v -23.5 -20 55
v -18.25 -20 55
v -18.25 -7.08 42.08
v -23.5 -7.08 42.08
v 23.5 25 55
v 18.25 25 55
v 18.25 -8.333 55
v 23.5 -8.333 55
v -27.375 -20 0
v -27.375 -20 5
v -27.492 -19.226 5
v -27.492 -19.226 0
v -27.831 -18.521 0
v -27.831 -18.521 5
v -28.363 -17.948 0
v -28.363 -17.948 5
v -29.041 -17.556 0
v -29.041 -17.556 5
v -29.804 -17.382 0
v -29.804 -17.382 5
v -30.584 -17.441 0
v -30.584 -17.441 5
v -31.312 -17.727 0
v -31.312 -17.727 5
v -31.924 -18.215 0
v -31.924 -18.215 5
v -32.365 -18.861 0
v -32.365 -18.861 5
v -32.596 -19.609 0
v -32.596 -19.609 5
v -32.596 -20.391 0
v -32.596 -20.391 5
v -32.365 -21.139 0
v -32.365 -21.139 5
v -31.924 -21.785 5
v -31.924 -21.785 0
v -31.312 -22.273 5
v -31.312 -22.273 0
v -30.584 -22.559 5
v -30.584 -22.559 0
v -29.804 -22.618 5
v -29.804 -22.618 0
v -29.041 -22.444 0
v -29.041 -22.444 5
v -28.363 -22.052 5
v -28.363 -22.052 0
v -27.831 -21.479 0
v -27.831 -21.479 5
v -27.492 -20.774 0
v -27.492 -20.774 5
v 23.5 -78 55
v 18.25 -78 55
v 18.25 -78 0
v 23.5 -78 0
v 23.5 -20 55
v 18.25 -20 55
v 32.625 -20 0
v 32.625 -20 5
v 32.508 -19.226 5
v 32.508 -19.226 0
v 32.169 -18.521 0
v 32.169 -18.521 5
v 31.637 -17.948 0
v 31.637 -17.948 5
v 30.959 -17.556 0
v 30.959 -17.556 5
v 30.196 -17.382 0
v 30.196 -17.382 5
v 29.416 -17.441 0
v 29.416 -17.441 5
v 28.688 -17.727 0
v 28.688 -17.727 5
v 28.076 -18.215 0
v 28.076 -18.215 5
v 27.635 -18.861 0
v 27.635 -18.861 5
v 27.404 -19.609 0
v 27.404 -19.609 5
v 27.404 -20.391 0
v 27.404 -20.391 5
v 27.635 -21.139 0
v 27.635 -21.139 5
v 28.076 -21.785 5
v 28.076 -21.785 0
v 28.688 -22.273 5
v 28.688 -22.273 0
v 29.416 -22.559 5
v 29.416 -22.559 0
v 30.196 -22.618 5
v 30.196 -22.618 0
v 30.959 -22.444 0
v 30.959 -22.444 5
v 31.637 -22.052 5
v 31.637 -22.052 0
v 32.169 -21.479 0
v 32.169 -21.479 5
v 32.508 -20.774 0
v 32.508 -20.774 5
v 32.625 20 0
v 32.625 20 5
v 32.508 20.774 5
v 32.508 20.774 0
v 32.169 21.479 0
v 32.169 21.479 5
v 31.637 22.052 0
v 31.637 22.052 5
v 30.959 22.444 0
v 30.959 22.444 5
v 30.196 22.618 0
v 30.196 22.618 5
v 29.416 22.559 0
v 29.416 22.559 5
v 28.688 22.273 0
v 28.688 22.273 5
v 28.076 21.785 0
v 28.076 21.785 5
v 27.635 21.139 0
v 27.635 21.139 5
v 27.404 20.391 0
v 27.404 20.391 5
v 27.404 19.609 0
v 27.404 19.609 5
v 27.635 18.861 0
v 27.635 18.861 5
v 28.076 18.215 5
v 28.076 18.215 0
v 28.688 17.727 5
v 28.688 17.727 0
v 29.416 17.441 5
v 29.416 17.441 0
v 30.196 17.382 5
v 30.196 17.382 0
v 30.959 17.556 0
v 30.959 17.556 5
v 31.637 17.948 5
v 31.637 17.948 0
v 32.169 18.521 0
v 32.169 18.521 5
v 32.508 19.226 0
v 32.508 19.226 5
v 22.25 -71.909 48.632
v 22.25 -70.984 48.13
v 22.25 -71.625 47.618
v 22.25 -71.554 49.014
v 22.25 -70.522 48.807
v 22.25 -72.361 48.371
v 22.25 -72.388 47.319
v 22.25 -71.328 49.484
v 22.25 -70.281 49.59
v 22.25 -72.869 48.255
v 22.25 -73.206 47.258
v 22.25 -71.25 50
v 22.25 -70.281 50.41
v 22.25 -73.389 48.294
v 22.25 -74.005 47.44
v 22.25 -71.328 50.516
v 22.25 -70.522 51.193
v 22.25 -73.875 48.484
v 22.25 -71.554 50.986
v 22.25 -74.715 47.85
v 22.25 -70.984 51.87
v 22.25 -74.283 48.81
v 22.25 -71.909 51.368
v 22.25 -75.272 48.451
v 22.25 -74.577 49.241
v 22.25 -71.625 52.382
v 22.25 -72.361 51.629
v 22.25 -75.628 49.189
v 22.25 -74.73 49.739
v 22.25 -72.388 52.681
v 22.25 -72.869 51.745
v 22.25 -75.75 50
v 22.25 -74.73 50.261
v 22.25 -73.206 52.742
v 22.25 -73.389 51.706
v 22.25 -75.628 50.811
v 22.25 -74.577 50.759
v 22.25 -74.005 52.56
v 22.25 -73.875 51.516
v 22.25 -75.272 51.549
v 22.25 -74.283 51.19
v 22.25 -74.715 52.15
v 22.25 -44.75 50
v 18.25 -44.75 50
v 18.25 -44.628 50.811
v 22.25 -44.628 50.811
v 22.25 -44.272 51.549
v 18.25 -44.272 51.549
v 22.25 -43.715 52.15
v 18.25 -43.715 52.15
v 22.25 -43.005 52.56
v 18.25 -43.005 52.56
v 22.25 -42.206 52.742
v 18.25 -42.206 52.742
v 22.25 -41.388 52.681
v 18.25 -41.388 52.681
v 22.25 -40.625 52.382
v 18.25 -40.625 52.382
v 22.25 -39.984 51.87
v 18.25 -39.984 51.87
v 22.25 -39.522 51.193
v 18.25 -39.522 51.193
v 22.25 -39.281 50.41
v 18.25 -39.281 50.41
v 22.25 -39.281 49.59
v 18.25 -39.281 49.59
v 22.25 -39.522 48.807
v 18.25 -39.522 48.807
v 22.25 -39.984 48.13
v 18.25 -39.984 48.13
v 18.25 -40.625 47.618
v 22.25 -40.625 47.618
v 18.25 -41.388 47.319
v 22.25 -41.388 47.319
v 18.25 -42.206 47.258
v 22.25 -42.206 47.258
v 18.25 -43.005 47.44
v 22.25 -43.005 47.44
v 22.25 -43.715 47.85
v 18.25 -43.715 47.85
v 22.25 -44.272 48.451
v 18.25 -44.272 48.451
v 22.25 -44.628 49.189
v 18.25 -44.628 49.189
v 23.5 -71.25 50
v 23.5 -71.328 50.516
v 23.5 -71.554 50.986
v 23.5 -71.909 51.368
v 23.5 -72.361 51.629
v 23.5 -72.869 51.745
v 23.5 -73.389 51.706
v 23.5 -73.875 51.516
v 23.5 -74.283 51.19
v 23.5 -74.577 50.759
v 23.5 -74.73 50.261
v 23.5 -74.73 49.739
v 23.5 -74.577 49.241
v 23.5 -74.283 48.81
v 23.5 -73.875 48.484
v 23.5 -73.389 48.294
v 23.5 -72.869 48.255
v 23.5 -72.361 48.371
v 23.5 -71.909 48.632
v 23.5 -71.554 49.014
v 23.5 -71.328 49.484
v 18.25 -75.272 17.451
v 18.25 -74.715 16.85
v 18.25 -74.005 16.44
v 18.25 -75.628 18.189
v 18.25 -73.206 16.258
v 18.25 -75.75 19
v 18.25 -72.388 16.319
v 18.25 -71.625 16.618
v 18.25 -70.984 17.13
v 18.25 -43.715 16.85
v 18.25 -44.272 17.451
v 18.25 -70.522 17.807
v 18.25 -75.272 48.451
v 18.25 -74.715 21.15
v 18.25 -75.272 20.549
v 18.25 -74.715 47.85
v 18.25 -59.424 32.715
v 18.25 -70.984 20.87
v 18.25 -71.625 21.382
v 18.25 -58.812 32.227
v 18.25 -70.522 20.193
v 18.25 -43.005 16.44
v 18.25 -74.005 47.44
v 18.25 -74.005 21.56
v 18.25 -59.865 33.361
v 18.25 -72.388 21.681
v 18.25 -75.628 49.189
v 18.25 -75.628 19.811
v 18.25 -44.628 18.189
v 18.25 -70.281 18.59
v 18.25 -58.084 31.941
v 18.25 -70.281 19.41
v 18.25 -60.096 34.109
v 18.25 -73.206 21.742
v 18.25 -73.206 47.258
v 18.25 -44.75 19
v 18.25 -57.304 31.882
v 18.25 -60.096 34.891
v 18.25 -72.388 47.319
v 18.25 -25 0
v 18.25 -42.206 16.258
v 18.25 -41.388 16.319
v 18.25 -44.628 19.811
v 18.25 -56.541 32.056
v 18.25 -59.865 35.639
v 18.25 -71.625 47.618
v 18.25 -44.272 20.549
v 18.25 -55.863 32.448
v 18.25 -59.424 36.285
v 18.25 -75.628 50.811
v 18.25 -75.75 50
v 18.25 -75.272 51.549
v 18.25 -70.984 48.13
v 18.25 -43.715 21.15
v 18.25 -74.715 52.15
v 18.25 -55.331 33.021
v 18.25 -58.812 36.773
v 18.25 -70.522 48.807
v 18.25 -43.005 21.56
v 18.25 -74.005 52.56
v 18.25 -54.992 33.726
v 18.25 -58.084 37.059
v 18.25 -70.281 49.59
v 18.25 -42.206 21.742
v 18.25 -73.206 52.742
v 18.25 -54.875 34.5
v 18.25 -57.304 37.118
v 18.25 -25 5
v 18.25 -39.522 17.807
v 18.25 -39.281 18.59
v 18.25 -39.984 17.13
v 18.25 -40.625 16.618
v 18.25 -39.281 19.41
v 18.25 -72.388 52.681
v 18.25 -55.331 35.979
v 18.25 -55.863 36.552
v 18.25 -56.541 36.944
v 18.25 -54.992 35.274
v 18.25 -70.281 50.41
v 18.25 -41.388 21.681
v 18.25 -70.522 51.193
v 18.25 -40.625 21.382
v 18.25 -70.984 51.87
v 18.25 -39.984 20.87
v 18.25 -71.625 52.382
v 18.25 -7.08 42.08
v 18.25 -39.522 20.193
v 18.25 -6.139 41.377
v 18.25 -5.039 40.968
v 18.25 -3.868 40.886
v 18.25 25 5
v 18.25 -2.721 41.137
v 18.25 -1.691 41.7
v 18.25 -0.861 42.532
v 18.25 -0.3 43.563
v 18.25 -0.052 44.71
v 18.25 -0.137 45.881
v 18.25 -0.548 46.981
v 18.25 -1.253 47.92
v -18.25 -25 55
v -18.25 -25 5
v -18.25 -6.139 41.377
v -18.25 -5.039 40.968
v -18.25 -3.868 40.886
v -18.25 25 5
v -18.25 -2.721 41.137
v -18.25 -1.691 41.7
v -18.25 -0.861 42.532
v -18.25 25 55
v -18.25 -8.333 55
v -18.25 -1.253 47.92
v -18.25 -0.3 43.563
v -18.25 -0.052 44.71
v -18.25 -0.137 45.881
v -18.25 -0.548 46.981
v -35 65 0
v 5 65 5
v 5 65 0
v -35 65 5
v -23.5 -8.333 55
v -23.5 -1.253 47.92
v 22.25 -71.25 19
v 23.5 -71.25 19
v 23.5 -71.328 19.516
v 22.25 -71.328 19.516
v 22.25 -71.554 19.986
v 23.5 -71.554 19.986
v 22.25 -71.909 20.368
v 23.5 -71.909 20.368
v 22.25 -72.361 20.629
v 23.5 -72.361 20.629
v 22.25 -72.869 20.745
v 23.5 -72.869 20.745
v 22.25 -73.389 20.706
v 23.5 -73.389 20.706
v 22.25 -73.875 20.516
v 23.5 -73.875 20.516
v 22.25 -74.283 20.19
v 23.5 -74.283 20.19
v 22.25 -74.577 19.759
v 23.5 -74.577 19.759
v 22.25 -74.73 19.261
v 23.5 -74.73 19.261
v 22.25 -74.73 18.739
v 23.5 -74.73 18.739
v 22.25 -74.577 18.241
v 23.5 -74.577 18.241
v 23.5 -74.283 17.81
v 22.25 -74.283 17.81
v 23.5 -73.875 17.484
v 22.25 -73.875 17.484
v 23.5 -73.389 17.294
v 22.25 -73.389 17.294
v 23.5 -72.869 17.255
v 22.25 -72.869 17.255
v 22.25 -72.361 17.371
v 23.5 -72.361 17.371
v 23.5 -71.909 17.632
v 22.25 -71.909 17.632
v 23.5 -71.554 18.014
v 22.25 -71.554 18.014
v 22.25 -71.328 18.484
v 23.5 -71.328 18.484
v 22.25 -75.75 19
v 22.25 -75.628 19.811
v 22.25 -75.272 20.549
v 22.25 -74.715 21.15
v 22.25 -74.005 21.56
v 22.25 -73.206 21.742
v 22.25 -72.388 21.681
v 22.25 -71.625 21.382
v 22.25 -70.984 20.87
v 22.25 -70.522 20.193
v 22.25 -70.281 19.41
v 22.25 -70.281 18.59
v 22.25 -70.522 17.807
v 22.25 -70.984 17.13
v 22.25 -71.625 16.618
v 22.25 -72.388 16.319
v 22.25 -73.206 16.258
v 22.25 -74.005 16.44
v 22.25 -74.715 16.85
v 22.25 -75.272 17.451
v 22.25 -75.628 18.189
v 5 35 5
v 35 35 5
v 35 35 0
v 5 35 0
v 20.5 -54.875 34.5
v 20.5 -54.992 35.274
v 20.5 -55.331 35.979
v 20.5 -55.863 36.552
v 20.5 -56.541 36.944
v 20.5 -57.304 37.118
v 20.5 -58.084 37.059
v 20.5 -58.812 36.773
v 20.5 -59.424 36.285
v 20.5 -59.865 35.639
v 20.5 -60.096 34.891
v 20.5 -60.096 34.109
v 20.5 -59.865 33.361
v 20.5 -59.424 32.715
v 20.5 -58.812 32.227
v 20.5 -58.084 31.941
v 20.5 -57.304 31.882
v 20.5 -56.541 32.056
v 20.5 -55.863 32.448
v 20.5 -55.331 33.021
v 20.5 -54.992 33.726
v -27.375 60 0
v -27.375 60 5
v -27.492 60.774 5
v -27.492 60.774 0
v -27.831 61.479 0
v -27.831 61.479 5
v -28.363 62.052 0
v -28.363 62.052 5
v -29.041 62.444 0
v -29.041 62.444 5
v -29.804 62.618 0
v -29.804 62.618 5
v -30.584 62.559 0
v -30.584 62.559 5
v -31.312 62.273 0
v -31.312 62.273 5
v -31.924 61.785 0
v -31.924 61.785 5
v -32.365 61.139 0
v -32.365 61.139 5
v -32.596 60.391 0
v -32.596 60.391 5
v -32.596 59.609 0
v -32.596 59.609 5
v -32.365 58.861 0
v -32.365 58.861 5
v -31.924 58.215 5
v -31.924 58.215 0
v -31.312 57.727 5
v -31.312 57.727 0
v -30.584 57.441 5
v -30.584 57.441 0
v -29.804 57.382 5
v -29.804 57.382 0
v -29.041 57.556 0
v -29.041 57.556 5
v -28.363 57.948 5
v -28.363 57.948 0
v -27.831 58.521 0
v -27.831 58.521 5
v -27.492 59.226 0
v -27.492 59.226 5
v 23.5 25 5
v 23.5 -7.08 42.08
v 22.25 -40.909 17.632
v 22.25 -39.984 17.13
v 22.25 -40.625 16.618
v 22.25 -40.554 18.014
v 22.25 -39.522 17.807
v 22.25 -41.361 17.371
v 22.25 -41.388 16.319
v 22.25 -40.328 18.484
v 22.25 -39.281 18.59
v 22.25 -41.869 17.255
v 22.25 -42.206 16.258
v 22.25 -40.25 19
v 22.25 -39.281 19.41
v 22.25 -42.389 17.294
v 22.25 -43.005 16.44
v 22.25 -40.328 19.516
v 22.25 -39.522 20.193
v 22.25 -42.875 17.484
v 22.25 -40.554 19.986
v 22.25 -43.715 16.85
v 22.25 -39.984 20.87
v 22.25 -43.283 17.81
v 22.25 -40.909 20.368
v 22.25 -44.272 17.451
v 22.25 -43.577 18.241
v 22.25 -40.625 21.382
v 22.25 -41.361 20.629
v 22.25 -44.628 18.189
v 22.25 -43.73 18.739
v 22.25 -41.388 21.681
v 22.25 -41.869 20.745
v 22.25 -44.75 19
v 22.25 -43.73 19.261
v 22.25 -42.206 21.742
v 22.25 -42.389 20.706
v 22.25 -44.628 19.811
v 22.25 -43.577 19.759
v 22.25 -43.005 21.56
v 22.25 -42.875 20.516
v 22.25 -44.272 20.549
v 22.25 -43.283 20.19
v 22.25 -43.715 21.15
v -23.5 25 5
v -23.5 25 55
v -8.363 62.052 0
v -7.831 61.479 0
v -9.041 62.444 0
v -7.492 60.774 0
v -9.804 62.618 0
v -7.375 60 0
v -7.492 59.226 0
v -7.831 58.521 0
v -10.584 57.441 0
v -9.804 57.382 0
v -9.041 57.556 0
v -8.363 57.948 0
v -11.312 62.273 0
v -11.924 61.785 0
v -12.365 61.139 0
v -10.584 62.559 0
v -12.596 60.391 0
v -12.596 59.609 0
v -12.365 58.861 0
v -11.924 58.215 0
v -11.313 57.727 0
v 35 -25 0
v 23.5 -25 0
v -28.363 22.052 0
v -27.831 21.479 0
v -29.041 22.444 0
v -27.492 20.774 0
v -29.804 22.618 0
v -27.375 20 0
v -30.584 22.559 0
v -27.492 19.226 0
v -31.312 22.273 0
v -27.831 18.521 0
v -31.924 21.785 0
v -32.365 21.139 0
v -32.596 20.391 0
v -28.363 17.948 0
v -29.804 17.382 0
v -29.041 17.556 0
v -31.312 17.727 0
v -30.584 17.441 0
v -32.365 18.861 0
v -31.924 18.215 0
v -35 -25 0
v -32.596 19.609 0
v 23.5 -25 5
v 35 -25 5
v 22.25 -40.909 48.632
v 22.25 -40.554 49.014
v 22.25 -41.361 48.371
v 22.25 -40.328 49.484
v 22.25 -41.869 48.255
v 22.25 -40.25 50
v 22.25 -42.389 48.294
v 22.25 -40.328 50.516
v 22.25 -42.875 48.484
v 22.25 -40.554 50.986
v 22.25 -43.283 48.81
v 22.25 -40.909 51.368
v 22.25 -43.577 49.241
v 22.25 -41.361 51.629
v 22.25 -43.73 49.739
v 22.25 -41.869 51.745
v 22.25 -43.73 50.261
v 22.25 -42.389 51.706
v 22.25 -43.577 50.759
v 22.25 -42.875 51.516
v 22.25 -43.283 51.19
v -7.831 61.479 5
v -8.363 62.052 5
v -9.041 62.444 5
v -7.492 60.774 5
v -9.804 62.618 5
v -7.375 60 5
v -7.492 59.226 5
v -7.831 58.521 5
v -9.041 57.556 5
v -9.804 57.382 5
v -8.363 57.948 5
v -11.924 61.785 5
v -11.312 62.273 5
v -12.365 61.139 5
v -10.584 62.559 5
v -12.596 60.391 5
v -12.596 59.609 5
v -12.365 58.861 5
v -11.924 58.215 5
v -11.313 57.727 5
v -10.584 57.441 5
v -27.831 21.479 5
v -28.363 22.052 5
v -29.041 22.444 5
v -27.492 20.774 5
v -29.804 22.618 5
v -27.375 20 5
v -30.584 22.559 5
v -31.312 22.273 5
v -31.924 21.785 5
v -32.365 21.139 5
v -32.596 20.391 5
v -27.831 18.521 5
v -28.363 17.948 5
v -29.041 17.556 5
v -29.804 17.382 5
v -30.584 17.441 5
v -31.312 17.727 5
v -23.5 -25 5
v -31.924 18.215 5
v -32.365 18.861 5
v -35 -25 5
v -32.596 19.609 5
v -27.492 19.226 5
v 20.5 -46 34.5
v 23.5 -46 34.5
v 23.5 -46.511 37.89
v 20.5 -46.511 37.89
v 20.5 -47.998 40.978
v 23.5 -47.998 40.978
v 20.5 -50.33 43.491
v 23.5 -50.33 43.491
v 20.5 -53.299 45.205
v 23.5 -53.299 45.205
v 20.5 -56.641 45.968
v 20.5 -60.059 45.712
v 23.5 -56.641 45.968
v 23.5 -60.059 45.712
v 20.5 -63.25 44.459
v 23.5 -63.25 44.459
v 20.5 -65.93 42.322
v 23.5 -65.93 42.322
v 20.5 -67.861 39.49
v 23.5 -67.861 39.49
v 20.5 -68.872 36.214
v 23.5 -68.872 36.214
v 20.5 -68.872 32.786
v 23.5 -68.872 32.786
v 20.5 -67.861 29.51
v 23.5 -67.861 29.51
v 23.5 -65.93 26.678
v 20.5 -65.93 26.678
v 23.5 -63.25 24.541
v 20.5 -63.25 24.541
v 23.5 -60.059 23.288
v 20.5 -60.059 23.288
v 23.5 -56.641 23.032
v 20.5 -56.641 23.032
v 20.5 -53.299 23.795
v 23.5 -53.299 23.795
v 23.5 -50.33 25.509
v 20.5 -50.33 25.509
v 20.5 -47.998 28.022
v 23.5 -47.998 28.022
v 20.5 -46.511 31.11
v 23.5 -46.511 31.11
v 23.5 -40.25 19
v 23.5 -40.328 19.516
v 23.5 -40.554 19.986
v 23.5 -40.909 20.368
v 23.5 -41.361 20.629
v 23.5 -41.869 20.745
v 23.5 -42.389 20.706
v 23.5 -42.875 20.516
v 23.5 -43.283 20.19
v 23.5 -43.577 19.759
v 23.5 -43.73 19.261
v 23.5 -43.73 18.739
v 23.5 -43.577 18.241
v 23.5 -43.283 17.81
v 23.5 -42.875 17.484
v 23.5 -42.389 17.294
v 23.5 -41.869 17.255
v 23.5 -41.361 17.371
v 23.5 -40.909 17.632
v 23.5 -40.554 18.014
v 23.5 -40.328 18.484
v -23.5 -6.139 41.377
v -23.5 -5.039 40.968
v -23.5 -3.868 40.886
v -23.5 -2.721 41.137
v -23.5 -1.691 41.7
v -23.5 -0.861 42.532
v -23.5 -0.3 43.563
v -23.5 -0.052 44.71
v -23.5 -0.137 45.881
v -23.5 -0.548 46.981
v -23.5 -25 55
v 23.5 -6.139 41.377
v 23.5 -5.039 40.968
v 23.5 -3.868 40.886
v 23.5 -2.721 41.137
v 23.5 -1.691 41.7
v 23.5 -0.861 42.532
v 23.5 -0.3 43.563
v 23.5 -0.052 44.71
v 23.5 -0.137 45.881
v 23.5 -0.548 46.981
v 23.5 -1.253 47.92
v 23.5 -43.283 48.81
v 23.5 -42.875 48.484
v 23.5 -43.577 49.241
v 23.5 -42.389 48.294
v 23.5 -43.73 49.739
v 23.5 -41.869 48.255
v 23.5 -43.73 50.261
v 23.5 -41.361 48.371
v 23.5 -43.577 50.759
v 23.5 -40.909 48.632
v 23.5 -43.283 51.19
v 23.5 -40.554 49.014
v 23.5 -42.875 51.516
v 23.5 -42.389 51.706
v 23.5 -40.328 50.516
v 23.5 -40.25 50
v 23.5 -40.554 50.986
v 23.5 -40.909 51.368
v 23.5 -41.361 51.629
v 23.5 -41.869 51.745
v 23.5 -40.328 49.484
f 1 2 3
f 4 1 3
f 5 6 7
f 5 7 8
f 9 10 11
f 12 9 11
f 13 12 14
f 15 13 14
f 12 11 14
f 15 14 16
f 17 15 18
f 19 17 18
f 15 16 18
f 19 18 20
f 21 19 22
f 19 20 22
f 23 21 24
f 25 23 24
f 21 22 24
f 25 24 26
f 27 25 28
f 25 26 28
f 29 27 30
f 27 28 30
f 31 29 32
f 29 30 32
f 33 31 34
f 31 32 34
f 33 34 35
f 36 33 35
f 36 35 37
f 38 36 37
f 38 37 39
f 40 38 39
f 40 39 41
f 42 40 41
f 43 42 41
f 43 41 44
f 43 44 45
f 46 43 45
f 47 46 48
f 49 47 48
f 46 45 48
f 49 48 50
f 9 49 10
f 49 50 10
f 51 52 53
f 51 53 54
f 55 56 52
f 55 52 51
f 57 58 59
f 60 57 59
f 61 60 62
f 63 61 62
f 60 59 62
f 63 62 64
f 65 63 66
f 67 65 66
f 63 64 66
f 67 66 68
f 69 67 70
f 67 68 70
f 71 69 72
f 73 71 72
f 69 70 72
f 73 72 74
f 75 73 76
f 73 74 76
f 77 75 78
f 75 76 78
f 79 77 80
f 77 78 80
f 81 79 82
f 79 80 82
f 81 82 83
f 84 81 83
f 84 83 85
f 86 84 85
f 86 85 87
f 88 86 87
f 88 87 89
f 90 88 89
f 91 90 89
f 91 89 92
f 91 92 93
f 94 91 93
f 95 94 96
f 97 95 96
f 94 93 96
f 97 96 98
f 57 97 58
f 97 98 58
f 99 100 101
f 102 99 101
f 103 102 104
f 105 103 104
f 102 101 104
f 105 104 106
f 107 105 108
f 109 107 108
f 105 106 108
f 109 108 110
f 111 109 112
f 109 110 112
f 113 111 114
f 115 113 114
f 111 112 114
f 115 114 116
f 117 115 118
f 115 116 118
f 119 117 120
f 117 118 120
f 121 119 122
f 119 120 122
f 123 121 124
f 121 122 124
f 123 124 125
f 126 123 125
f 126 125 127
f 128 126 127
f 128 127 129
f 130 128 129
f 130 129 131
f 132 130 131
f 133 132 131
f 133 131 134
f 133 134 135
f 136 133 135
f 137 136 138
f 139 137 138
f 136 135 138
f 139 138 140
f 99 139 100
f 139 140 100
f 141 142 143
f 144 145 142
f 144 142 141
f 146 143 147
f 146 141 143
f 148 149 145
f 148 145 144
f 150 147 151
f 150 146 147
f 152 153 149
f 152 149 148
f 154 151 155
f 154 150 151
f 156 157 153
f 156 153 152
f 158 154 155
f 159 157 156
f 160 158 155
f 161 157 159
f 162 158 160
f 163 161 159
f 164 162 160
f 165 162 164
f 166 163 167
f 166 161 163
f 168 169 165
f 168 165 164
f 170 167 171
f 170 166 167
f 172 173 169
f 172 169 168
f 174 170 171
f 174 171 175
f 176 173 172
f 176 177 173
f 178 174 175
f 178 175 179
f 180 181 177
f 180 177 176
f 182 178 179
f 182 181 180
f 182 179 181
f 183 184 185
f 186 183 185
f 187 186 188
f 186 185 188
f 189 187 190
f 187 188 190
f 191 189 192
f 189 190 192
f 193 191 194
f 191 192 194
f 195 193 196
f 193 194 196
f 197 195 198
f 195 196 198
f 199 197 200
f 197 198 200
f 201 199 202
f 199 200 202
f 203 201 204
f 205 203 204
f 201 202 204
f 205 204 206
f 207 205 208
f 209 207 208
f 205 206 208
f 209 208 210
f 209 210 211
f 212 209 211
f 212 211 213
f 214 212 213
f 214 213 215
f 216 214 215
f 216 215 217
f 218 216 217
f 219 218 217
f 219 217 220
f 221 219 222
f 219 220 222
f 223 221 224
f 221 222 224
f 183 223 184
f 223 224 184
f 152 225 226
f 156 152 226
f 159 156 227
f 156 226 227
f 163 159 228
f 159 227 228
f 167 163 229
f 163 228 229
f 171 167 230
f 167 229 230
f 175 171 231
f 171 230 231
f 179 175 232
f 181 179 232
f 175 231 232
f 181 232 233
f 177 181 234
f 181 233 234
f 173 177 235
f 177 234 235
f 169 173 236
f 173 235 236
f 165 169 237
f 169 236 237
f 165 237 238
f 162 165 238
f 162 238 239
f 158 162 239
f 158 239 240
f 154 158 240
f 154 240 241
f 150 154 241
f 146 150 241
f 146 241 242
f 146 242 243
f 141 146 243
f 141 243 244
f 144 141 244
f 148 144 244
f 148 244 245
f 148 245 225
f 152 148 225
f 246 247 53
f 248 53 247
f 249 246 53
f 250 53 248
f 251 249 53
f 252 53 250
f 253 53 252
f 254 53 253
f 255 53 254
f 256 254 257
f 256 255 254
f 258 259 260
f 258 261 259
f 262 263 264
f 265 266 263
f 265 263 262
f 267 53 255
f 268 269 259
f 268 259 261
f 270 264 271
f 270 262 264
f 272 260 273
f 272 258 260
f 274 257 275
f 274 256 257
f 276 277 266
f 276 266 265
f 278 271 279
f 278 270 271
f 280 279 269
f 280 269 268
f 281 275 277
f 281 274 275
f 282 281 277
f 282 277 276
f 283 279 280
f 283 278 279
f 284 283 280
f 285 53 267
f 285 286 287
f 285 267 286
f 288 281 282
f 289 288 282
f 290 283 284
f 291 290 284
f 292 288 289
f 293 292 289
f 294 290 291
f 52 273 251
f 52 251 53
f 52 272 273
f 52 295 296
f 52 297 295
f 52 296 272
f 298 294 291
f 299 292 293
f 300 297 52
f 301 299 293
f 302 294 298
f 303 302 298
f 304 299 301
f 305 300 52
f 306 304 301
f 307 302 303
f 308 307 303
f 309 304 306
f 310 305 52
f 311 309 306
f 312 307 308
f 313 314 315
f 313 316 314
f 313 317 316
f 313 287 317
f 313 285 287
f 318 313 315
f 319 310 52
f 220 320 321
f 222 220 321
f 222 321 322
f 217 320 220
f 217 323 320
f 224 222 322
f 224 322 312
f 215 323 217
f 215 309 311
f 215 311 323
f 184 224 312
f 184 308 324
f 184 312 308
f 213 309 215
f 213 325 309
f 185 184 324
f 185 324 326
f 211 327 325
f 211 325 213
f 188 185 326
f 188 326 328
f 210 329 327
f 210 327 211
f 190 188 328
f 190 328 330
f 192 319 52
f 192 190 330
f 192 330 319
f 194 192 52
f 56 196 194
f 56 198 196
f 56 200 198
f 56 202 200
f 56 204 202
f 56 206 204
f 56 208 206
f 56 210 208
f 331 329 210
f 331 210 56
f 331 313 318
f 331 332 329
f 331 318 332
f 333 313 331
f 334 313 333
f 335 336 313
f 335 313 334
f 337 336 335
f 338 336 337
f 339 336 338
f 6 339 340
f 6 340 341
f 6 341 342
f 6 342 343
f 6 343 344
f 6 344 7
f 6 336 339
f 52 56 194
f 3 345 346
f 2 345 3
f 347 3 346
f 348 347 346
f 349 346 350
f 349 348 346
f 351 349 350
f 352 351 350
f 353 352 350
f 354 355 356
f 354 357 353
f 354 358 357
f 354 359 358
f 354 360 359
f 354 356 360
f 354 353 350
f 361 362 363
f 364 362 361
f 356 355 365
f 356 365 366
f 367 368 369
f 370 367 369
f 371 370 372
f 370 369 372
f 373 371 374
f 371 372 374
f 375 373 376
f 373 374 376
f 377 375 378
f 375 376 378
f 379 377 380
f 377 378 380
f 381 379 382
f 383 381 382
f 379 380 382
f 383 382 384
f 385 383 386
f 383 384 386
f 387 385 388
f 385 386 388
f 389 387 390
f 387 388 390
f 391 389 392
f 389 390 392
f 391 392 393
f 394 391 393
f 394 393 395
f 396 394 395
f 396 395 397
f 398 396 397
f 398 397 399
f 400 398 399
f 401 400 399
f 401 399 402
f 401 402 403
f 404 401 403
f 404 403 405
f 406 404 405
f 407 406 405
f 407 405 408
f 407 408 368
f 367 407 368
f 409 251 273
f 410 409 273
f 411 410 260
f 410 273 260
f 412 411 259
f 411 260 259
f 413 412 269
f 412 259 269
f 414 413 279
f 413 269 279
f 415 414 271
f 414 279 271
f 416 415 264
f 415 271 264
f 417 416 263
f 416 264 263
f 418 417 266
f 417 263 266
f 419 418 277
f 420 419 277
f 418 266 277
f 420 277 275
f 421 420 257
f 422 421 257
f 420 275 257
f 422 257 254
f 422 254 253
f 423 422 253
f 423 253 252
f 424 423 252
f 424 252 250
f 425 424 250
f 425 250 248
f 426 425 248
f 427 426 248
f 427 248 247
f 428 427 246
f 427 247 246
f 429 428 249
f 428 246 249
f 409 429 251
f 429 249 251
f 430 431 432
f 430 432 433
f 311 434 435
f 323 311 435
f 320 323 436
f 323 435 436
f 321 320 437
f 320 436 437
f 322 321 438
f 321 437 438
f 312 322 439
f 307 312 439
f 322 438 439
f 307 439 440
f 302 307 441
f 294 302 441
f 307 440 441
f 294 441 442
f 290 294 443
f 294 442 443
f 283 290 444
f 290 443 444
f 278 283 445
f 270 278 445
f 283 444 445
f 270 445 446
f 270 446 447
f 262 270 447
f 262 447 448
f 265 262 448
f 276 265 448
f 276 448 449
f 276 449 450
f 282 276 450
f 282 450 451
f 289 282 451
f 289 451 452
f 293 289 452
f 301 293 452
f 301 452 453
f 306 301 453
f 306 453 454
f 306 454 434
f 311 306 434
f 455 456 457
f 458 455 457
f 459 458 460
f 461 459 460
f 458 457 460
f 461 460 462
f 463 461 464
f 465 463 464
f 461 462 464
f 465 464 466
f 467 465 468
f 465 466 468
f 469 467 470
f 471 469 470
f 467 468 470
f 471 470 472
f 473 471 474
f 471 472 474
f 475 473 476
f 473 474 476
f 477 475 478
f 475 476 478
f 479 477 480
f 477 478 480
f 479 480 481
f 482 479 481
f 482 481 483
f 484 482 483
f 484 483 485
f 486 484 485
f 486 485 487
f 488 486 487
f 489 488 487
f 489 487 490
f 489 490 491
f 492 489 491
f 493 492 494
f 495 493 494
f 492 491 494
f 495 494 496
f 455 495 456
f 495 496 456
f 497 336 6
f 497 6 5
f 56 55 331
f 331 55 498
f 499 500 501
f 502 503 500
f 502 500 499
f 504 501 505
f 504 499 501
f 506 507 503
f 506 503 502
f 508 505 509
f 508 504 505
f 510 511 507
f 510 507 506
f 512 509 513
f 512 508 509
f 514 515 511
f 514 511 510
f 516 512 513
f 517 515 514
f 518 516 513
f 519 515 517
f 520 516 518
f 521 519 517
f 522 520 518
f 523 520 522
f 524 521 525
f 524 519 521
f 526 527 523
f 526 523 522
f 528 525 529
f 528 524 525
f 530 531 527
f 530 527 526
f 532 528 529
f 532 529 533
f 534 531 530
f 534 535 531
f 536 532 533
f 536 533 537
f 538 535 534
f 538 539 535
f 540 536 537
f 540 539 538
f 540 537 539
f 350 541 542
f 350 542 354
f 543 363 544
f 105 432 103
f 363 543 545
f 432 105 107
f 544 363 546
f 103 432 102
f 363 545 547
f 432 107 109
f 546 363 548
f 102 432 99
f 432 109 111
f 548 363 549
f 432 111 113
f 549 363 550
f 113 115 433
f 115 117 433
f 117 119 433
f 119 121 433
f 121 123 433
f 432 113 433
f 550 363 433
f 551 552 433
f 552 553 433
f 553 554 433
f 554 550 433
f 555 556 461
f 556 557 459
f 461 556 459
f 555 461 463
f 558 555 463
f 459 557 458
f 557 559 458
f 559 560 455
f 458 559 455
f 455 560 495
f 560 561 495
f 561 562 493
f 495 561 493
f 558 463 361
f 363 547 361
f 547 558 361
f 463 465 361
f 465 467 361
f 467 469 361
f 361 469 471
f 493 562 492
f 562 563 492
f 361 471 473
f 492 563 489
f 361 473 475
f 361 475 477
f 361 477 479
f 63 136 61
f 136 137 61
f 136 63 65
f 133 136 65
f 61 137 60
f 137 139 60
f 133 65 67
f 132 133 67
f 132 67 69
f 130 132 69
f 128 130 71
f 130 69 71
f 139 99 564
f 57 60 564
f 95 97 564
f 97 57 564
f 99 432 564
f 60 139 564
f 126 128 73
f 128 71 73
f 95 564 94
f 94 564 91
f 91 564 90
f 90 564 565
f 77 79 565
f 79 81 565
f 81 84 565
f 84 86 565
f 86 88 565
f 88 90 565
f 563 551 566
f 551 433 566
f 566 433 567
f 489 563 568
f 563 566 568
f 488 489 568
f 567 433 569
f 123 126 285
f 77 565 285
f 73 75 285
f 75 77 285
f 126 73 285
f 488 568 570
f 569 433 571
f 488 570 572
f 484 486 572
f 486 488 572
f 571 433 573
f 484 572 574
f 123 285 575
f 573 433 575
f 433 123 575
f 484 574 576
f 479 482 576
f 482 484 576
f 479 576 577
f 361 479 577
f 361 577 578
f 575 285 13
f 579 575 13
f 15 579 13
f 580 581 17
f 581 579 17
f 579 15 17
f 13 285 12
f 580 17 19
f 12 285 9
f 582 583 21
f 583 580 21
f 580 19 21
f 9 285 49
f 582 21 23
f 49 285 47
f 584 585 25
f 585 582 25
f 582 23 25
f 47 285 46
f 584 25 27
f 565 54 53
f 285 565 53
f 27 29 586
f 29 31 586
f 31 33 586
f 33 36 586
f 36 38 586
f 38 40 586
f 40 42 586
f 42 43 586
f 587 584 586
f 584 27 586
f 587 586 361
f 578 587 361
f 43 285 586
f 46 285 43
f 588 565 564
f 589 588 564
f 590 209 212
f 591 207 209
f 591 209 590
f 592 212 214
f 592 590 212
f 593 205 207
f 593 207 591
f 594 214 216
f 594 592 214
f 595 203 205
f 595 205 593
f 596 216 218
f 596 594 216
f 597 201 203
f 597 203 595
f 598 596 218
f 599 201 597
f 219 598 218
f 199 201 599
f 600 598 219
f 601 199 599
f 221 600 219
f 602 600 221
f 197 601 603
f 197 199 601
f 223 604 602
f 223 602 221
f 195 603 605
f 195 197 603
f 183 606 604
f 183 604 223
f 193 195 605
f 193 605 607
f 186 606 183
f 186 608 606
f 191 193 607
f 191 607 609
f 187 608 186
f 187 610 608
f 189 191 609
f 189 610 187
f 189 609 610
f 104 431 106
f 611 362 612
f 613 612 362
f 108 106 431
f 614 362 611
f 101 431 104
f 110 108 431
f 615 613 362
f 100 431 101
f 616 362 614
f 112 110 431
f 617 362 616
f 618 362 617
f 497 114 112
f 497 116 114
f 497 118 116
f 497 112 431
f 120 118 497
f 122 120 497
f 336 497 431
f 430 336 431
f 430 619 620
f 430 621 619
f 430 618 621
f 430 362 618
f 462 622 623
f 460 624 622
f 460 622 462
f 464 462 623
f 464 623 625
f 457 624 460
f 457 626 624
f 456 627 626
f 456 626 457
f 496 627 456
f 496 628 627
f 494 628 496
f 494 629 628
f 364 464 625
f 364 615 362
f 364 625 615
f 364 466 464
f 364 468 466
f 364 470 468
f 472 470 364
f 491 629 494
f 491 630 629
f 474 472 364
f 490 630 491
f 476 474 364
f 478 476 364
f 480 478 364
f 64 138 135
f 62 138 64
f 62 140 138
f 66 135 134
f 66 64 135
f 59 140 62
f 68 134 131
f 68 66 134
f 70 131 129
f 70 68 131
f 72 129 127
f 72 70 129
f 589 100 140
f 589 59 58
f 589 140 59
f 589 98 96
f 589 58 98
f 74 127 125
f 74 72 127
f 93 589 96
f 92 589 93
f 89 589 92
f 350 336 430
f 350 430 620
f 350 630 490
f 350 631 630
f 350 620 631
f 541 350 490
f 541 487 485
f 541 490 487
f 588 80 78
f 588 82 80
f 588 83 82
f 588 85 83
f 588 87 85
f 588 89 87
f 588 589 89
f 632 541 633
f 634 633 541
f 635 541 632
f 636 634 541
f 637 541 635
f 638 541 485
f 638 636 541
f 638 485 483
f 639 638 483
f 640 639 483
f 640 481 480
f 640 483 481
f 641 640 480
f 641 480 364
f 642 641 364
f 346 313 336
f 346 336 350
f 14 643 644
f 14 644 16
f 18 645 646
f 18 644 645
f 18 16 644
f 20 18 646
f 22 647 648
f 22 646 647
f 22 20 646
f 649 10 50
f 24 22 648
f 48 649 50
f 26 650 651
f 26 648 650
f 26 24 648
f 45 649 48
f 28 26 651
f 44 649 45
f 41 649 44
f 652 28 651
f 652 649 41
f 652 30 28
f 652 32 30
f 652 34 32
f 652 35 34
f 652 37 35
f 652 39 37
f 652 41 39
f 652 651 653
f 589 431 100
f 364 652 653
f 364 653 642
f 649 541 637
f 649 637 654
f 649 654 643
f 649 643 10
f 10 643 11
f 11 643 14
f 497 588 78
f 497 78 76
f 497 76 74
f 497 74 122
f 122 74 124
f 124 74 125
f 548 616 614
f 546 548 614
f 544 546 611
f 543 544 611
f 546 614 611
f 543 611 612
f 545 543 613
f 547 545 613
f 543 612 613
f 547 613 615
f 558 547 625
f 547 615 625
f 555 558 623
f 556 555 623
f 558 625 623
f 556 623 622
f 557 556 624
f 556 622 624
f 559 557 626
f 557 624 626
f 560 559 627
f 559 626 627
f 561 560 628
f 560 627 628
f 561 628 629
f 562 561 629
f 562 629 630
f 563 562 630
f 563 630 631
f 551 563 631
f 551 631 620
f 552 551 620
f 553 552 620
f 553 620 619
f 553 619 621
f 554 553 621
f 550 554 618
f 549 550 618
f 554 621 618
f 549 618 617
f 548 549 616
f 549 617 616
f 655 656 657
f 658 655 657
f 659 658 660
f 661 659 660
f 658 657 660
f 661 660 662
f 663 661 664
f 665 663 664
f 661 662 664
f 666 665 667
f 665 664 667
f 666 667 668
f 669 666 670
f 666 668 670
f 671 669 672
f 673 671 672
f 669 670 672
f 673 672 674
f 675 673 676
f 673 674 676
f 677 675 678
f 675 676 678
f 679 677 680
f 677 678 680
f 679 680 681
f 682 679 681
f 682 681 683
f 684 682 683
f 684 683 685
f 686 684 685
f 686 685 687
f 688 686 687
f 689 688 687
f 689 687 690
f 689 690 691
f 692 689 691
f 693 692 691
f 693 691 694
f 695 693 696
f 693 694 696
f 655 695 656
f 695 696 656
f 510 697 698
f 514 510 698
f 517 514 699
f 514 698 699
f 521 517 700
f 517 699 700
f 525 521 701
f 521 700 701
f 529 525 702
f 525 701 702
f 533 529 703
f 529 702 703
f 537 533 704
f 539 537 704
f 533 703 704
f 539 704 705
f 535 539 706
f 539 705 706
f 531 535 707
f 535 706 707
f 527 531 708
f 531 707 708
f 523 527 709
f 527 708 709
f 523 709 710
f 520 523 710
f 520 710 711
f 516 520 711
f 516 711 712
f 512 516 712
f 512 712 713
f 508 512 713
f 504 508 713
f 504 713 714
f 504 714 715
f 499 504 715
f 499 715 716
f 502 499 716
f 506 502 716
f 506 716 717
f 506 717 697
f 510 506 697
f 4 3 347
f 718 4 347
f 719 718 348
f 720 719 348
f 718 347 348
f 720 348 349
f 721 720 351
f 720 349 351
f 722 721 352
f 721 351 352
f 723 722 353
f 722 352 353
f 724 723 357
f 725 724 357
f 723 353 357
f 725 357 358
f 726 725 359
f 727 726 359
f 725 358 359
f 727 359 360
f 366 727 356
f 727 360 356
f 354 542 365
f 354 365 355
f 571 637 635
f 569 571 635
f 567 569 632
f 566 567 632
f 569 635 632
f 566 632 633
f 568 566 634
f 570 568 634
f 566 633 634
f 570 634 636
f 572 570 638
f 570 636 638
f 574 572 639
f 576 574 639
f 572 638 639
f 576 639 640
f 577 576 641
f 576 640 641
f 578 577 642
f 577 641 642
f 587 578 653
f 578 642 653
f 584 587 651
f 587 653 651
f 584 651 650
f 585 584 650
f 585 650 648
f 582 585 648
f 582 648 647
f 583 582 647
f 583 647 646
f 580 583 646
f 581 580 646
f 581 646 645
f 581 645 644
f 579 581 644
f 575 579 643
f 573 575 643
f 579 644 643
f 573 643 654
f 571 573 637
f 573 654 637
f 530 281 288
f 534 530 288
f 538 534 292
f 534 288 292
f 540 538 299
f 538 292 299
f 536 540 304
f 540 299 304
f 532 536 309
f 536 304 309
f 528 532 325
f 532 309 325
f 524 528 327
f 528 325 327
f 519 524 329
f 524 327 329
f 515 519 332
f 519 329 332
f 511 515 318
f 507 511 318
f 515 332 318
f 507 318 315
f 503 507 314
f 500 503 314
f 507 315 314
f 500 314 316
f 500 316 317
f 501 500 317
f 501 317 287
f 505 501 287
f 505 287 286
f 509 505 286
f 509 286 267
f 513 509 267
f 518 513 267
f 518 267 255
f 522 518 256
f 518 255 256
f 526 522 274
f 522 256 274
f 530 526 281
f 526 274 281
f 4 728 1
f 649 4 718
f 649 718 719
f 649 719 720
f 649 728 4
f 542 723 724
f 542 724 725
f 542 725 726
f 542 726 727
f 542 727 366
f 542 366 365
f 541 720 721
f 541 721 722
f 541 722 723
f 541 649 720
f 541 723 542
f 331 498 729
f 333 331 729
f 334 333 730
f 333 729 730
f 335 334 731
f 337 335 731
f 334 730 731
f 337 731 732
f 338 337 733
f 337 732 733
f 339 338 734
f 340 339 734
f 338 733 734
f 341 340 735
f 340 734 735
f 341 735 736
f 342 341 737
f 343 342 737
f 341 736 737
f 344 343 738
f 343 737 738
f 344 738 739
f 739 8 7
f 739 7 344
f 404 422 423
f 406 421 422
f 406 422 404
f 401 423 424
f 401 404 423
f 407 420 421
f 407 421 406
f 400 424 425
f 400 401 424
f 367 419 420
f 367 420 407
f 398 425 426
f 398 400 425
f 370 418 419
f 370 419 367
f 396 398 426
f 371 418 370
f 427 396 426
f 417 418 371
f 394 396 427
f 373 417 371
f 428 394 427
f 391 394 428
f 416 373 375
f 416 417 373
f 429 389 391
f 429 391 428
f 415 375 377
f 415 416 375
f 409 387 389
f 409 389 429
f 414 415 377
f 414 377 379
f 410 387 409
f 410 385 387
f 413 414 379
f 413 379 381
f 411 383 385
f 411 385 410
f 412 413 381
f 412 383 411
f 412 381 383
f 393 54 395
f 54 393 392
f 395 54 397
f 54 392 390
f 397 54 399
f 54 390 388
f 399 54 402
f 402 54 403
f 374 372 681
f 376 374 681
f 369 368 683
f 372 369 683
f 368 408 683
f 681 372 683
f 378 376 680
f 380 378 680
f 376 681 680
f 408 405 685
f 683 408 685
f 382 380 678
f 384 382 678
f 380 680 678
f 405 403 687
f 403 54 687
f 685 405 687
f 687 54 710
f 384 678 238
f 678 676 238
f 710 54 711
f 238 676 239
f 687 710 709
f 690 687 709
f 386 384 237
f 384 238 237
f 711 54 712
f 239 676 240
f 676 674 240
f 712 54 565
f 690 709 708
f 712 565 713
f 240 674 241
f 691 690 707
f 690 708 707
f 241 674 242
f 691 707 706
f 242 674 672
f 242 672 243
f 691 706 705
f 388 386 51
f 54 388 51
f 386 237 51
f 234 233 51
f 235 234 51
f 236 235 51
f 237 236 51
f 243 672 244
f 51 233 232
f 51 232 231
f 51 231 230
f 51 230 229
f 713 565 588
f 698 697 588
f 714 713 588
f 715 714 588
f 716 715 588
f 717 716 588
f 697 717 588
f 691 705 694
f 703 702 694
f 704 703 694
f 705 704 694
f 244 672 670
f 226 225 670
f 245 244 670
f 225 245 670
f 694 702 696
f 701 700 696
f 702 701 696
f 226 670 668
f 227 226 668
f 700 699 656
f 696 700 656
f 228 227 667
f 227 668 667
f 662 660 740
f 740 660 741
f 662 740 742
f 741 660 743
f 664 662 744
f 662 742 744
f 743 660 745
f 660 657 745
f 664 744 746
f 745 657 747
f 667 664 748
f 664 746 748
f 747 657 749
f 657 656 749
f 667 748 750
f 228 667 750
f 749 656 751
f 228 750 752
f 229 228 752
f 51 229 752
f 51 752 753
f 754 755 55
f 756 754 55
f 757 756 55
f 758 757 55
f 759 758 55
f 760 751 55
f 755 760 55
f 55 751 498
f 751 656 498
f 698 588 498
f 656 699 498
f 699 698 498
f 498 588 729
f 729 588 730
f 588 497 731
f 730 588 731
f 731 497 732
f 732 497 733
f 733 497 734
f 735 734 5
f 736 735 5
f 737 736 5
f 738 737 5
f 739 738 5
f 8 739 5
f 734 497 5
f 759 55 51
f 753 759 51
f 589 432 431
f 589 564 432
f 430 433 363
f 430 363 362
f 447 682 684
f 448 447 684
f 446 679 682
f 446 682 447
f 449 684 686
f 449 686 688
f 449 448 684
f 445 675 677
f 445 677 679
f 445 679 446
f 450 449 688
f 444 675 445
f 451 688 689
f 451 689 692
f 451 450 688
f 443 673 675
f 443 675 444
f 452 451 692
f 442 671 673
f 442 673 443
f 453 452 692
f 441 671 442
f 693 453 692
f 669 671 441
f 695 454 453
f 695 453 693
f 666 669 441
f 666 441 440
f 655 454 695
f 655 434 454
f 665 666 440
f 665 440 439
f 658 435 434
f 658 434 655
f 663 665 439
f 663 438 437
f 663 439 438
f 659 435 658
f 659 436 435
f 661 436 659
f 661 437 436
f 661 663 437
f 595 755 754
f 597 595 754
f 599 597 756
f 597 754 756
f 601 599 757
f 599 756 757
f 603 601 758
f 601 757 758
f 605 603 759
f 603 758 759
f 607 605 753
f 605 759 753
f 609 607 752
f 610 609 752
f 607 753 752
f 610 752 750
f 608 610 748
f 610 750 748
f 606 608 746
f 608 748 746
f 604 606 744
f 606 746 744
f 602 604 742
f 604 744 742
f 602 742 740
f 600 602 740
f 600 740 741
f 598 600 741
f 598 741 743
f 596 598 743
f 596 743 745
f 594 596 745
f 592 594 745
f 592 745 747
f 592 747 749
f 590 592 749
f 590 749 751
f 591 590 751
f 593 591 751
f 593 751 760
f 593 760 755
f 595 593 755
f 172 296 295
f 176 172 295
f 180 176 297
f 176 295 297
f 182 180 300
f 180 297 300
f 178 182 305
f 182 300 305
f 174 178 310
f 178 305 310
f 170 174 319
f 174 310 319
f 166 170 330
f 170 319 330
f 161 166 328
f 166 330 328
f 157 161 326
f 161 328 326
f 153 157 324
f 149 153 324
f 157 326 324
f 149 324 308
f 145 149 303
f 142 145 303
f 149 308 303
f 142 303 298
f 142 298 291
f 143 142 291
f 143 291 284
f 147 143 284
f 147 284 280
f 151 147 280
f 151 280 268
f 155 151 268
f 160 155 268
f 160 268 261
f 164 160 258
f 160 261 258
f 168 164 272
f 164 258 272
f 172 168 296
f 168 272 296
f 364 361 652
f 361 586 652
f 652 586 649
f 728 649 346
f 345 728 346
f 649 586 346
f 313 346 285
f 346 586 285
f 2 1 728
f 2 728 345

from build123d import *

# Parameters (mm, degrees)
SKETCH_W        = 70
SKETCH_H        = 50
PAD_DEPTH       = 5
SKETCH001_R     = 2.625
POCKET_DEPTH    = 5
SKETCH002_W     = 47
SKETCH002_H     = 50
PAD001_DEPTH    = 50
SKETCH003_W     = 36.5
SKETCH003_H     = 50
POCKET001_DEPTH = 50
POCKET002_DEPTH = 40
POCKET003_DEPTH = 50
SKETCH005_W     = 5.25
SKETCH005_H     = 55
PAD002_DEPTH    = 53
SKETCH006_R     = 1.75
POCKET004_DEPTH = 7
SKETCH007_R     = 11.5
POCKET005_DEPTH = 3
SKETCH008_R     = 2.75
POCKET006_DEPTH = 4
SKETCH009_R     = 2.625
POCKET007_DEPTH = 5
SKETCH010_W     = 40
SKETCH010_H     = 5
PAD003_DEPTH    = 40
SKETCH011_R     = 2.625
POCKET008_DEPTH = 5
SKETCH012_W     = 30
SKETCH012_H     = 5
PAD004_DEPTH    = 10


with BuildPart() as part:
    # Sketch → Pad (new body)
    with BuildSketch(Plane.XY):
        Rectangle(SKETCH_W, SKETCH_H)
    extrude(amount=PAD_DEPTH)

    # Sketch001 (on Face6 of Pad) → Pocket (cut)
    with BuildSketch(Plane.XY.offset(5)):
        with Locations((-30, 20)):
            Circle(SKETCH001_R)
        with Locations((30, 20)):
            Circle(SKETCH001_R)
        with Locations((30, -20)):
            Circle(SKETCH001_R)
        with Locations((-30, -20)):
            Circle(SKETCH001_R)
    extrude(amount=-POCKET_DEPTH, mode=Mode.SUBTRACT)

    # Sketch002 (on Face5 of Pocket) → Pad001 (join)
    with BuildSketch(Plane.XY.offset(5)):
        Rectangle(SKETCH002_W, SKETCH002_H)
    extrude(amount=PAD001_DEPTH)

    # Sketch003 (on Face16 of Pad001) → Pocket001 (cut)
    with BuildSketch(Plane.XY.offset(55)):
        Rectangle(SKETCH003_W, SKETCH003_H)
    extrude(amount=-POCKET001_DEPTH, mode=Mode.SUBTRACT)

    # Sketch004 (on Face18 of Pocket001) → Pocket002 (cut)
    with BuildSketch(Plane.YZ.offset(23.5)):
        with BuildLine():
            Line((-8.332745, 55), (-1.252745, 47.92))
            ThreePointArc((-7.08, 42.08), (-1.246373, 42.086373), (-1.252745, 47.92))
            Line((-20, 55), (-7.08, 42.08))
            Line((-20, 55), (-8.332745, 55))
        make_face()
    extrude(amount=-POCKET002_DEPTH, mode=Mode.SUBTRACT)

    # Sketch004 (on Face18 of Pocket001) → Pocket003 (cut)
    with BuildSketch(Plane.YZ.offset(23.5)):
        with BuildLine():
            Line((-8.332745, 55), (-1.252745, 47.92))
            ThreePointArc((-7.08, 42.08), (-1.246373, 42.086373), (-1.252745, 47.92))
            Line((-20, 55), (-7.08, 42.08))
            Line((-20, 55), (-8.332745, 55))
        make_face()
    extrude(amount=-POCKET003_DEPTH, mode=Mode.SUBTRACT)

    # Sketch005 (on Face8 of Pocket003) → Pad002 (join)
    with BuildSketch(Plane.XZ.offset(25)):
        with Locations((20.875, 27.5)):
            Rectangle(SKETCH005_W, SKETCH005_H)
    extrude(amount=PAD002_DEPTH)

    # Sketch006 (on Face28 of Pad002) → Pocket004 (cut)
    with BuildSketch(Plane.YZ.offset(23.5)):
        with Locations((-73, 50)):
            Circle(SKETCH006_R)
        with Locations((-42, 50)):
            Circle(SKETCH006_R)
        with Locations((-42, 19)):
            Circle(SKETCH006_R)
        with Locations((-73, 19)):
            Circle(SKETCH006_R)
    extrude(amount=-POCKET004_DEPTH, mode=Mode.SUBTRACT)

    # Sketch007 (on Face32 of Pocket004) → Pocket005 (cut)
    with BuildSketch(Plane.YZ.offset(23.5)):
        with Locations((-57.5, 34.5)):
            Circle(SKETCH007_R)
    extrude(amount=-POCKET005_DEPTH, mode=Mode.SUBTRACT)

    # Sketch008 (on Face8 of Pocket005) → Pocket006 (cut)
    with BuildSketch(Plane(origin=(18.25, 0, 0), x_dir=(0, -1, 0), z_dir=(-1, 0, 0))):
        with Locations((42, 50)):
            Circle(SKETCH008_R)
        with Locations((73, 50)):
            Circle(SKETCH008_R)
        with Locations((73, 19)):
            Circle(SKETCH008_R)
        with Locations((42, 19)):
            Circle(SKETCH008_R)
    extrude(amount=-POCKET006_DEPTH, mode=Mode.SUBTRACT)

    # Sketch009 (on Face49 of Pocket006) → Pocket007 (cut)
    with BuildSketch(Plane.YZ.offset(20.5)):
        with Locations((-57.5, 34.5)):
            Circle(SKETCH009_R)
    extrude(amount=-POCKET007_DEPTH, mode=Mode.SUBTRACT)

    # Sketch010 (on Face3 of Pocket007) → Pad003 (join)
    with BuildSketch(Plane(origin=(0, 25, 0), x_dir=(-1, 0, 0), z_dir=(0, 1, 0))):
        with Locations((15, 2.5)):
            Rectangle(SKETCH010_W, SKETCH010_H)
    extrude(amount=PAD003_DEPTH)

    # Sketch011 (on Face10 of Pad003) → Pocket008 (cut)
    with BuildSketch(Plane.XY.offset(5)):
        with Locations((-30, 60)):
            Circle(SKETCH011_R)
        with Locations((-10, 60)):
            Circle(SKETCH011_R)
    extrude(amount=-POCKET008_DEPTH, mode=Mode.SUBTRACT)

    # Sketch012 (on Face14 of Pocket008) → Pad004 (join)
    with BuildSketch(Plane(origin=(0, 25, 0), x_dir=(-1, 0, 0), z_dir=(0, 1, 0))):
        with Locations((-20, 2.5)):
            Rectangle(SKETCH012_W, SKETCH012_H)
    extrude(amount=PAD004_DEPTH)


solid = part.part
